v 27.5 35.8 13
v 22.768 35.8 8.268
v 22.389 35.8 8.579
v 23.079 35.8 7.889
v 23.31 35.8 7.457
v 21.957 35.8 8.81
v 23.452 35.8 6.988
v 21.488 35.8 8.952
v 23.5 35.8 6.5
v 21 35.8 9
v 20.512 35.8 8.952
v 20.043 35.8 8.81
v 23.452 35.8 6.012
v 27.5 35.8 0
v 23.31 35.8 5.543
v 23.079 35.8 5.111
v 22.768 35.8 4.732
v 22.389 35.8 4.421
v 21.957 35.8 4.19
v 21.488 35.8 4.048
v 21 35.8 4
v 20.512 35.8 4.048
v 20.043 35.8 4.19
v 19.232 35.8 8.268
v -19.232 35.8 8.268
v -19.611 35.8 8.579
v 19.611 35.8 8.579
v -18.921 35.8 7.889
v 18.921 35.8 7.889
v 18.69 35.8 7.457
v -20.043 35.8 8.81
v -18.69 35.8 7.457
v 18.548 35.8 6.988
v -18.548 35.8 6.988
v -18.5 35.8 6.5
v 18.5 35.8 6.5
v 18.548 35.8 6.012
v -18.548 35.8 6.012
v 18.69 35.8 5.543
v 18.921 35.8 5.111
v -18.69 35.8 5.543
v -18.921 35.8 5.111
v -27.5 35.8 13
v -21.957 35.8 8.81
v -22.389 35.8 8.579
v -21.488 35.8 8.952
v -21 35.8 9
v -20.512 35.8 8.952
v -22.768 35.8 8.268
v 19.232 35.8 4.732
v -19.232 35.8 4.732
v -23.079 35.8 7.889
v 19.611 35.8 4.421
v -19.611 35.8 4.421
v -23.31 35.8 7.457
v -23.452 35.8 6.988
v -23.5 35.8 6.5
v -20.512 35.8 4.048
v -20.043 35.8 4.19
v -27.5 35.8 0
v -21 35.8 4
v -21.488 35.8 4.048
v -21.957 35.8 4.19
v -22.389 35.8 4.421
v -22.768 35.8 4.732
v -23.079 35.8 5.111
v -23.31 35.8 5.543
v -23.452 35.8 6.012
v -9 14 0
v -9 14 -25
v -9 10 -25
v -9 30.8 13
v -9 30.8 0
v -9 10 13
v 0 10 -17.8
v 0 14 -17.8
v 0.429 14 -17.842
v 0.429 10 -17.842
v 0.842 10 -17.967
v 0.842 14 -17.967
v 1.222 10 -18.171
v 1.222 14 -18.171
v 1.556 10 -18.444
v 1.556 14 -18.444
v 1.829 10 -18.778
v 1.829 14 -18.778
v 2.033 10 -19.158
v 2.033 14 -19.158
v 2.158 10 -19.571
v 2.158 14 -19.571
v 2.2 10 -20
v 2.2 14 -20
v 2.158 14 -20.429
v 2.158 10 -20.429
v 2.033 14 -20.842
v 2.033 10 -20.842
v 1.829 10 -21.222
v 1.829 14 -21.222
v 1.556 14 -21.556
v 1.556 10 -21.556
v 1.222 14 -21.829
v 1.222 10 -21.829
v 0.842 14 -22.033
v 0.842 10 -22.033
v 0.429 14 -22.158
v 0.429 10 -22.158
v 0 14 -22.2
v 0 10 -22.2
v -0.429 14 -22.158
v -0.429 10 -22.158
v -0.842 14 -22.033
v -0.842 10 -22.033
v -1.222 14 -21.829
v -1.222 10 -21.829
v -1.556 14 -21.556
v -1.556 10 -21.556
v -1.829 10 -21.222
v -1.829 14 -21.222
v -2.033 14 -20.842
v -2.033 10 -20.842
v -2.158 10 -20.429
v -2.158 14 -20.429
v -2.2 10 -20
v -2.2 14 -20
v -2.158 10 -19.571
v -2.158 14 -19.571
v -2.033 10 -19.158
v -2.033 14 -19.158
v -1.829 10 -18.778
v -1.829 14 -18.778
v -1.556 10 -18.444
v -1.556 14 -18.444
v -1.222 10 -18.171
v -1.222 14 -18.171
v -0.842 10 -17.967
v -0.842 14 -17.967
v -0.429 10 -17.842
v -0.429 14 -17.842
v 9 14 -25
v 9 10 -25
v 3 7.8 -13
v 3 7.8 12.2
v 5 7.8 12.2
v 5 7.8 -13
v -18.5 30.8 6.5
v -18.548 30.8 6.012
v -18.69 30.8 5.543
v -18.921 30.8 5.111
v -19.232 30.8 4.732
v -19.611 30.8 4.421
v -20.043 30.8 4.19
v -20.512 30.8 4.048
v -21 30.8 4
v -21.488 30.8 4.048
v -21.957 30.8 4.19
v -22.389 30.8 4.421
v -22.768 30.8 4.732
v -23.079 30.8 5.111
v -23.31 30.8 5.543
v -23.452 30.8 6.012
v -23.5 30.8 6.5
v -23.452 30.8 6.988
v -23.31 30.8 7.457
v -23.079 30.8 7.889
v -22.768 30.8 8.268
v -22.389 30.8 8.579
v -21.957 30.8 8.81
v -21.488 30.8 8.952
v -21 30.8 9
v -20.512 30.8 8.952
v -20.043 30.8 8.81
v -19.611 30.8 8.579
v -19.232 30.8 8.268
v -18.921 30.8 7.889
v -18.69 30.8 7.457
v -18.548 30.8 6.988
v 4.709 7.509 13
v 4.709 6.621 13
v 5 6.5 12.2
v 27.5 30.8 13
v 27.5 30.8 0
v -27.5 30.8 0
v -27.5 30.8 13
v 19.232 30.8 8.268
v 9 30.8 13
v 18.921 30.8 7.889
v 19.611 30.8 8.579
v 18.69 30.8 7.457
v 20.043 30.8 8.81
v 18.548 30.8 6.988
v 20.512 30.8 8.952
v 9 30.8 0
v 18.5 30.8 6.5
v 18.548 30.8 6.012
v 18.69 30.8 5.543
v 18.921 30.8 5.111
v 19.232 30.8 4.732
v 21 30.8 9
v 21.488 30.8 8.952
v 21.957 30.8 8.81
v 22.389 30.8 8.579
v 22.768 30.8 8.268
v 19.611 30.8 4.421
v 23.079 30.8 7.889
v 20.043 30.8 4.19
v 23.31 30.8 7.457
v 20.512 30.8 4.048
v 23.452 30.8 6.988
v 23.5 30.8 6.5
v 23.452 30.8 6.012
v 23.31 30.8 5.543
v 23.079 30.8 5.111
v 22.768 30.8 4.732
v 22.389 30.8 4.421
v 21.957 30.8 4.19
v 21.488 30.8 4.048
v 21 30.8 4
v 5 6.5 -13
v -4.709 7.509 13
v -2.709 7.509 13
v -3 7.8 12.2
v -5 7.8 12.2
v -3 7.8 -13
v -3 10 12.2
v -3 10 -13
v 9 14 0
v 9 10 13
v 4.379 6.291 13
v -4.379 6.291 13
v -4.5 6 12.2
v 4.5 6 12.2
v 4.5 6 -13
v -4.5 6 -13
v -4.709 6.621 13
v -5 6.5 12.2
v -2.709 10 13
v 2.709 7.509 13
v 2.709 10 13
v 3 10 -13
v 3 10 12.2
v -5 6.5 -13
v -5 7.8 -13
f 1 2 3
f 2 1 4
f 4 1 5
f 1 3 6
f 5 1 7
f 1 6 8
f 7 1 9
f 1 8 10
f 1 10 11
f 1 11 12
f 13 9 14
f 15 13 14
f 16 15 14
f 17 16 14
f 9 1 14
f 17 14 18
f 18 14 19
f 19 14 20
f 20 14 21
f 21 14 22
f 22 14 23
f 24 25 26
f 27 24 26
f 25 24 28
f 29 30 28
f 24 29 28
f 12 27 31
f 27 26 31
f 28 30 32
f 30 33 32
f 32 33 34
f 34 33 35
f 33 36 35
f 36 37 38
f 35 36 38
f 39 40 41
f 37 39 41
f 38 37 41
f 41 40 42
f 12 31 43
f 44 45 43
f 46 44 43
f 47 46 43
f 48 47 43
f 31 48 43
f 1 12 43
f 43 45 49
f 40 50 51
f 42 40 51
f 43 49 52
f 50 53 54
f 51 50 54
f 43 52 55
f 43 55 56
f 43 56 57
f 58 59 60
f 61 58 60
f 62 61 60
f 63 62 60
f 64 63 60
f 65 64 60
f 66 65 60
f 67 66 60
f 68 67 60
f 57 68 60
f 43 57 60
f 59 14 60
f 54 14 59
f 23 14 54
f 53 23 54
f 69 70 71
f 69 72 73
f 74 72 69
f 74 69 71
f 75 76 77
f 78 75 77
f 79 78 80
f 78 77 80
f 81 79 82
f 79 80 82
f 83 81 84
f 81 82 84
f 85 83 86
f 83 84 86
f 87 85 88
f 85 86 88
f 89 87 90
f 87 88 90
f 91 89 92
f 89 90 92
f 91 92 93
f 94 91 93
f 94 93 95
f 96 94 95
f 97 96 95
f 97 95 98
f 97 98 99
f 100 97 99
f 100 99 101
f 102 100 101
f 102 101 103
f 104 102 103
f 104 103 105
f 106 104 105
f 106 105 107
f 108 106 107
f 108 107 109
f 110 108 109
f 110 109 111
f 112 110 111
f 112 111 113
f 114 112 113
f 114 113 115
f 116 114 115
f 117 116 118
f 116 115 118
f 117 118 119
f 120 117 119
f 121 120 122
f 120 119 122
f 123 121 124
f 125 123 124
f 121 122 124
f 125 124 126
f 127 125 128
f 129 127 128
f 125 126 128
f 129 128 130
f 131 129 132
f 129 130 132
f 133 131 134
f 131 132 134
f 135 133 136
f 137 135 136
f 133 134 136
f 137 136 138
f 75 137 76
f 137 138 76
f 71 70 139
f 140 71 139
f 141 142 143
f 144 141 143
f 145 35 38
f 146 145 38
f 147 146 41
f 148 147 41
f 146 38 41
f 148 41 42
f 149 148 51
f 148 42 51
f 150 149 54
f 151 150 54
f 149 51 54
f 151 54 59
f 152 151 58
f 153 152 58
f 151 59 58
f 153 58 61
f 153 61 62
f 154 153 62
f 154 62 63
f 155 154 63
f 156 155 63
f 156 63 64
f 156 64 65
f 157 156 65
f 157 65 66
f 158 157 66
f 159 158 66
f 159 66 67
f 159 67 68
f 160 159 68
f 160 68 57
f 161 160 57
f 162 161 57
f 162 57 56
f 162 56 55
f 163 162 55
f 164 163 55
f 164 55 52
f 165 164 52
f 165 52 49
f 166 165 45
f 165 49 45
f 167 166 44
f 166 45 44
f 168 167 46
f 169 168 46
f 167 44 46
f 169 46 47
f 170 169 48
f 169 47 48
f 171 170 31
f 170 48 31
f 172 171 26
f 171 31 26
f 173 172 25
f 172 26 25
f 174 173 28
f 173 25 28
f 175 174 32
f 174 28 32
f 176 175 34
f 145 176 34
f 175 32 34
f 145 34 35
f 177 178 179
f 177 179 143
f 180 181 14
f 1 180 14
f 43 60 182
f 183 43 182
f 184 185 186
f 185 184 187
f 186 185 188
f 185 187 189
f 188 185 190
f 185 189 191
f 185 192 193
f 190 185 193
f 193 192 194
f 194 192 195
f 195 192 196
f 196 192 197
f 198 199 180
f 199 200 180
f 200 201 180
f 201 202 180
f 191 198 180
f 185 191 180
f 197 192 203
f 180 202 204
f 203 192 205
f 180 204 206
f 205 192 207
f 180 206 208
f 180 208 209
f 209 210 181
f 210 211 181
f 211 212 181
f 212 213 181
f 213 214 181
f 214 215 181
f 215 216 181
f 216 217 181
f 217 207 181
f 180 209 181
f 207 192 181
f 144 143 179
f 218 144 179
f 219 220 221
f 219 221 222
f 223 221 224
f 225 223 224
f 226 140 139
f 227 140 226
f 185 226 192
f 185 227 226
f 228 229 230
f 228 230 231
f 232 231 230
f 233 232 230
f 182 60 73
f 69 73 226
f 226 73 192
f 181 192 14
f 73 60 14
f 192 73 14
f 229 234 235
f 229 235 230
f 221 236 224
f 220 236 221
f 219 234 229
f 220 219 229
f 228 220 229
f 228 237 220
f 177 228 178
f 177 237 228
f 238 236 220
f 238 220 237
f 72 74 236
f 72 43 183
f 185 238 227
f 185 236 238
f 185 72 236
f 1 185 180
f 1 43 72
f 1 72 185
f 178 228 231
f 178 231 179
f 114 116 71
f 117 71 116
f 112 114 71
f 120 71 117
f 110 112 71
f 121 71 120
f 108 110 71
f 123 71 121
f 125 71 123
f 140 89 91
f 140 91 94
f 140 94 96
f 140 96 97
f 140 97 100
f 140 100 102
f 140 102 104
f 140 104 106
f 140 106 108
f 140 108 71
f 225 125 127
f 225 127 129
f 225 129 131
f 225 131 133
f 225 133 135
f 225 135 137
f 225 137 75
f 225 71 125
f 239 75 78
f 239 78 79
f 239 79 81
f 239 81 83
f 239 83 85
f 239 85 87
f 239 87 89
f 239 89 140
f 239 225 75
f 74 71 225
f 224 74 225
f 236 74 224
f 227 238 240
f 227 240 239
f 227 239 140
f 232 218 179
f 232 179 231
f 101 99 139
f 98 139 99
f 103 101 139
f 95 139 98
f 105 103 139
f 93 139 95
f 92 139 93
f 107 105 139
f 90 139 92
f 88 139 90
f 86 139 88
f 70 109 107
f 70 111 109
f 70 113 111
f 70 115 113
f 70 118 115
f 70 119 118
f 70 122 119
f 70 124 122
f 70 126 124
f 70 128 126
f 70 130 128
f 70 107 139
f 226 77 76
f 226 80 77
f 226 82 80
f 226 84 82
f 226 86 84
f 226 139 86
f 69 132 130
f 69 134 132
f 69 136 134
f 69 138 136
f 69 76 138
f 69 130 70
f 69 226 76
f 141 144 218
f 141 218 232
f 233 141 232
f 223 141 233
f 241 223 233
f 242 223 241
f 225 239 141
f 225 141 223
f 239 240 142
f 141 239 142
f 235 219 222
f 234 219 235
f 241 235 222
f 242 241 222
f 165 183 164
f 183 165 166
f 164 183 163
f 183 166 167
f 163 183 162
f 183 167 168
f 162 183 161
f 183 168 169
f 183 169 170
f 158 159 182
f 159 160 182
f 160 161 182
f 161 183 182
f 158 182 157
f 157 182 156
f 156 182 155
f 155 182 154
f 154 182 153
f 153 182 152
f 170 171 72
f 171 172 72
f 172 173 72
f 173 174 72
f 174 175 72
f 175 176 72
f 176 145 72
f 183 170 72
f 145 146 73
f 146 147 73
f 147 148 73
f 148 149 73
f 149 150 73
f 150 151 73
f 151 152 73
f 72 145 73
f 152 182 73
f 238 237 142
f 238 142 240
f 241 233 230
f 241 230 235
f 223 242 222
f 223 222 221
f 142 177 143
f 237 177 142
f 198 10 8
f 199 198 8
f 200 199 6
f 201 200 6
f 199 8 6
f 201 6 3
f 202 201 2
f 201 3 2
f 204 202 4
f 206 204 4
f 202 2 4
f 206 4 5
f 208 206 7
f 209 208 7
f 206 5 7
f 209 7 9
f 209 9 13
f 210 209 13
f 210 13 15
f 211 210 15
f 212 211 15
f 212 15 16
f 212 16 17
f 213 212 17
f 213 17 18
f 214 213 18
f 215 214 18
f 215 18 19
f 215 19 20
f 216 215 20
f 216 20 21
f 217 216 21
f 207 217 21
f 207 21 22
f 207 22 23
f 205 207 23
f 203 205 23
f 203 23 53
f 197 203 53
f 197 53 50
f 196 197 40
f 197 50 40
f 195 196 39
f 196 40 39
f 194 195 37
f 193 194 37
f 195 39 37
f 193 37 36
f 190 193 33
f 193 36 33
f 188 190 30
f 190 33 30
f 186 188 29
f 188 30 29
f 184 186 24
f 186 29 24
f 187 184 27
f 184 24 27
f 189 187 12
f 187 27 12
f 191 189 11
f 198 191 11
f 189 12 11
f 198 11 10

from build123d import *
from OCP.BRepFilletAPI import BRepFilletAPI_MakeChamfer

# Parameters (mm, degrees)
EXTRUDE_1_DEPTH     = 13
SKETCH_2_R          = 2.5
CUT_EXTRUDE_1_DEPTH = 43.582742984
EXTRUDE_2_DEPTH     = 25
EXTRUDE_3_DEPTH     = 13
SKETCH_4_R          = 2.2
CUT_EXTRUDE_3_DEPTH = 44.087005002
CHAMFER_3_SIZE      = 0.8
CHAMFER_3_SIZE2     = 0.291176187


with BuildPart() as part:
    # 草图1 → 凸台-拉伸1 (new body)
    with BuildSketch(Plane.XY):
        Polygon((3, 10), (9, 10), (9, 30.8), (27.5, 30.8), (27.5, 35.8), (-27.5, 35.8), (-27.5, 30.8), (-9, 30.8), (-9, 10), (-3, 10), (-3, 7.8), (-5, 7.8), (-5, 6.5), (-4.5, 6), (4.5, 6), (5, 6.5), (5, 7.8), (3, 7.8), align=None)
    extrude(amount=EXTRUDE_1_DEPTH)

    # 草图2 → 切除-拉伸1 (cut, through all)
    with BuildSketch(Plane(origin=(0, 35.8, 0), x_dir=(1, 0, 0), z_dir=(0, 1, 0))):
        with Locations(Location((21, -6.5, 0), (0, 0, 270))):
            Circle(SKETCH_2_R)
        with Locations((-21, -6.5)):
            Circle(SKETCH_2_R)
    extrude(amount=-CUT_EXTRUDE_1_DEPTH, mode=Mode.SUBTRACT)

    # 草图1<10> → 凸台-拉伸2 (add)
    with BuildSketch(Plane.XY):
        Polygon((3, 10), (9, 10), (9, 14), (-9, 14), (-9, 10), (-3, 10), align=None)
    extrude(amount=-EXTRUDE_2_DEPTH)

    # 草图1<11> → 凸台-拉伸3 (add)
    with BuildSketch(Plane.XY):
        Polygon((3, 7.8), (5, 7.8), (5, 6.5), (4.5, 6), (-4.5, 6), (-5, 6.5), (-5, 7.8), (-3, 7.8), (-3, 10), (3, 10), align=None)
    extrude(amount=-EXTRUDE_3_DEPTH)

    # 草图4 → 切除-拉伸3 (cut, through all)
    with BuildSketch(Plane(origin=(0, 14, 0), x_dir=(1, 0, 0), z_dir=(0, 1, 0))):
        with Locations(Location((0, 20, 0), (0, 0, 270))):
            Circle(SKETCH_4_R)
    extrude(amount=-CUT_EXTRUDE_3_DEPTH, mode=Mode.SUBTRACT)

    # 倒角3: one chamfer whose edges measure the first distance from different faces: ONE call of the kernel's chamfer builder (chamfer() names one face for all edges)
    chamfer_3_edges_1 = [part.edges().sort_by_distance(p)[0] for p in [
        (-3, 8.9, 13),
    ]]
    chamfer_3_side_1 = [part.faces().sort_by_distance(p)[0] for p in [
        (-3, 8.9, 0),
    ]]
    chamfer_3_edges_2 = [part.edges().sort_by_distance(p)[0] for p in [
        (3, 8.9, 13),
    ]]
    chamfer_3_side_2 = [part.faces().sort_by_distance(p)[0] for p in [
        (3, 8.9, 0),
    ]]
    chamfer_3_edges_3 = [part.edges().sort_by_distance(p)[0] for p in [
        (4, 7.8, 13),
    ]]
    chamfer_3_side_3 = [part.faces().sort_by_distance(p)[0] for p in [
        (4, 7.8, 0),
    ]]
    chamfer_3_edges_4 = [part.edges().sort_by_distance(p)[0] for p in [
        (5, 7.15, 13),
    ]]
    chamfer_3_side_4 = [part.faces().sort_by_distance(p)[0] for p in [
        (5, 7.15, 0),
    ]]
    chamfer_3_edges_5 = [part.edges().sort_by_distance(p)[0] for p in [
        (4.75, 6.25, 13),
    ]]
    chamfer_3_side_5 = [part.faces().sort_by_distance(p)[0] for p in [
        (4.75, 6.25, 0),
    ]]
    chamfer_3_edges_6 = [part.edges().sort_by_distance(p)[0] for p in [
        (0, 6, 13),
    ]]
    chamfer_3_side_6 = [part.faces().sort_by_distance(p)[0] for p in [
        (0, 6, 0),
    ]]
    chamfer_3_edges_7 = [part.edges().sort_by_distance(p)[0] for p in [
        (-4, 7.8, 13),
    ]]
    chamfer_3_side_7 = [part.faces().sort_by_distance(p)[0] for p in [
        (-4, 7.8, 0),
    ]]
    chamfer_3_edges_8 = [part.edges().sort_by_distance(p)[0] for p in [
        (-5, 7.15, 13),
    ]]
    chamfer_3_side_8 = [part.faces().sort_by_distance(p)[0] for p in [
        (-5, 7.15, 0),
    ]]
    chamfer_3_edges_9 = [part.edges().sort_by_distance(p)[0] for p in [
        (-4.75, 6.25, 13),
    ]]
    chamfer_3_side_9 = [part.faces().sort_by_distance(p)[0] for p in [
        (-4.75, 6.25, 0),
    ]]
    chamfer_3 = BRepFilletAPI_MakeChamfer(part.part.solid().wrapped)
    for e in chamfer_3_edges_1:
        chamfer_3.Add(CHAMFER_3_SIZE, CHAMFER_3_SIZE2, e.wrapped, chamfer_3_side_1[0].wrapped)  # the first distance lies on this face
    for e in chamfer_3_edges_2:
        chamfer_3.Add(CHAMFER_3_SIZE, CHAMFER_3_SIZE2, e.wrapped, chamfer_3_side_2[0].wrapped)  # the first distance lies on this face
    for e in chamfer_3_edges_3:
        chamfer_3.Add(CHAMFER_3_SIZE, CHAMFER_3_SIZE2, e.wrapped, chamfer_3_side_3[0].wrapped)  # the first distance lies on this face
    for e in chamfer_3_edges_4:
        chamfer_3.Add(CHAMFER_3_SIZE, CHAMFER_3_SIZE2, e.wrapped, chamfer_3_side_4[0].wrapped)  # the first distance lies on this face
    for e in chamfer_3_edges_5:
        chamfer_3.Add(CHAMFER_3_SIZE, CHAMFER_3_SIZE2, e.wrapped, chamfer_3_side_5[0].wrapped)  # the first distance lies on this face
    for e in chamfer_3_edges_6:
        chamfer_3.Add(CHAMFER_3_SIZE, CHAMFER_3_SIZE2, e.wrapped, chamfer_3_side_6[0].wrapped)  # the first distance lies on this face
    for e in chamfer_3_edges_7:
        chamfer_3.Add(CHAMFER_3_SIZE, CHAMFER_3_SIZE2, e.wrapped, chamfer_3_side_7[0].wrapped)  # the first distance lies on this face
    for e in chamfer_3_edges_8:
        chamfer_3.Add(CHAMFER_3_SIZE, CHAMFER_3_SIZE2, e.wrapped, chamfer_3_side_8[0].wrapped)  # the first distance lies on this face
    for e in chamfer_3_edges_9:
        chamfer_3.Add(CHAMFER_3_SIZE, CHAMFER_3_SIZE2, e.wrapped, chamfer_3_side_9[0].wrapped)  # the first distance lies on this face
    add(Compound.cast(chamfer_3.Shape()), mode=Mode.REPLACE)


solid = part.part
